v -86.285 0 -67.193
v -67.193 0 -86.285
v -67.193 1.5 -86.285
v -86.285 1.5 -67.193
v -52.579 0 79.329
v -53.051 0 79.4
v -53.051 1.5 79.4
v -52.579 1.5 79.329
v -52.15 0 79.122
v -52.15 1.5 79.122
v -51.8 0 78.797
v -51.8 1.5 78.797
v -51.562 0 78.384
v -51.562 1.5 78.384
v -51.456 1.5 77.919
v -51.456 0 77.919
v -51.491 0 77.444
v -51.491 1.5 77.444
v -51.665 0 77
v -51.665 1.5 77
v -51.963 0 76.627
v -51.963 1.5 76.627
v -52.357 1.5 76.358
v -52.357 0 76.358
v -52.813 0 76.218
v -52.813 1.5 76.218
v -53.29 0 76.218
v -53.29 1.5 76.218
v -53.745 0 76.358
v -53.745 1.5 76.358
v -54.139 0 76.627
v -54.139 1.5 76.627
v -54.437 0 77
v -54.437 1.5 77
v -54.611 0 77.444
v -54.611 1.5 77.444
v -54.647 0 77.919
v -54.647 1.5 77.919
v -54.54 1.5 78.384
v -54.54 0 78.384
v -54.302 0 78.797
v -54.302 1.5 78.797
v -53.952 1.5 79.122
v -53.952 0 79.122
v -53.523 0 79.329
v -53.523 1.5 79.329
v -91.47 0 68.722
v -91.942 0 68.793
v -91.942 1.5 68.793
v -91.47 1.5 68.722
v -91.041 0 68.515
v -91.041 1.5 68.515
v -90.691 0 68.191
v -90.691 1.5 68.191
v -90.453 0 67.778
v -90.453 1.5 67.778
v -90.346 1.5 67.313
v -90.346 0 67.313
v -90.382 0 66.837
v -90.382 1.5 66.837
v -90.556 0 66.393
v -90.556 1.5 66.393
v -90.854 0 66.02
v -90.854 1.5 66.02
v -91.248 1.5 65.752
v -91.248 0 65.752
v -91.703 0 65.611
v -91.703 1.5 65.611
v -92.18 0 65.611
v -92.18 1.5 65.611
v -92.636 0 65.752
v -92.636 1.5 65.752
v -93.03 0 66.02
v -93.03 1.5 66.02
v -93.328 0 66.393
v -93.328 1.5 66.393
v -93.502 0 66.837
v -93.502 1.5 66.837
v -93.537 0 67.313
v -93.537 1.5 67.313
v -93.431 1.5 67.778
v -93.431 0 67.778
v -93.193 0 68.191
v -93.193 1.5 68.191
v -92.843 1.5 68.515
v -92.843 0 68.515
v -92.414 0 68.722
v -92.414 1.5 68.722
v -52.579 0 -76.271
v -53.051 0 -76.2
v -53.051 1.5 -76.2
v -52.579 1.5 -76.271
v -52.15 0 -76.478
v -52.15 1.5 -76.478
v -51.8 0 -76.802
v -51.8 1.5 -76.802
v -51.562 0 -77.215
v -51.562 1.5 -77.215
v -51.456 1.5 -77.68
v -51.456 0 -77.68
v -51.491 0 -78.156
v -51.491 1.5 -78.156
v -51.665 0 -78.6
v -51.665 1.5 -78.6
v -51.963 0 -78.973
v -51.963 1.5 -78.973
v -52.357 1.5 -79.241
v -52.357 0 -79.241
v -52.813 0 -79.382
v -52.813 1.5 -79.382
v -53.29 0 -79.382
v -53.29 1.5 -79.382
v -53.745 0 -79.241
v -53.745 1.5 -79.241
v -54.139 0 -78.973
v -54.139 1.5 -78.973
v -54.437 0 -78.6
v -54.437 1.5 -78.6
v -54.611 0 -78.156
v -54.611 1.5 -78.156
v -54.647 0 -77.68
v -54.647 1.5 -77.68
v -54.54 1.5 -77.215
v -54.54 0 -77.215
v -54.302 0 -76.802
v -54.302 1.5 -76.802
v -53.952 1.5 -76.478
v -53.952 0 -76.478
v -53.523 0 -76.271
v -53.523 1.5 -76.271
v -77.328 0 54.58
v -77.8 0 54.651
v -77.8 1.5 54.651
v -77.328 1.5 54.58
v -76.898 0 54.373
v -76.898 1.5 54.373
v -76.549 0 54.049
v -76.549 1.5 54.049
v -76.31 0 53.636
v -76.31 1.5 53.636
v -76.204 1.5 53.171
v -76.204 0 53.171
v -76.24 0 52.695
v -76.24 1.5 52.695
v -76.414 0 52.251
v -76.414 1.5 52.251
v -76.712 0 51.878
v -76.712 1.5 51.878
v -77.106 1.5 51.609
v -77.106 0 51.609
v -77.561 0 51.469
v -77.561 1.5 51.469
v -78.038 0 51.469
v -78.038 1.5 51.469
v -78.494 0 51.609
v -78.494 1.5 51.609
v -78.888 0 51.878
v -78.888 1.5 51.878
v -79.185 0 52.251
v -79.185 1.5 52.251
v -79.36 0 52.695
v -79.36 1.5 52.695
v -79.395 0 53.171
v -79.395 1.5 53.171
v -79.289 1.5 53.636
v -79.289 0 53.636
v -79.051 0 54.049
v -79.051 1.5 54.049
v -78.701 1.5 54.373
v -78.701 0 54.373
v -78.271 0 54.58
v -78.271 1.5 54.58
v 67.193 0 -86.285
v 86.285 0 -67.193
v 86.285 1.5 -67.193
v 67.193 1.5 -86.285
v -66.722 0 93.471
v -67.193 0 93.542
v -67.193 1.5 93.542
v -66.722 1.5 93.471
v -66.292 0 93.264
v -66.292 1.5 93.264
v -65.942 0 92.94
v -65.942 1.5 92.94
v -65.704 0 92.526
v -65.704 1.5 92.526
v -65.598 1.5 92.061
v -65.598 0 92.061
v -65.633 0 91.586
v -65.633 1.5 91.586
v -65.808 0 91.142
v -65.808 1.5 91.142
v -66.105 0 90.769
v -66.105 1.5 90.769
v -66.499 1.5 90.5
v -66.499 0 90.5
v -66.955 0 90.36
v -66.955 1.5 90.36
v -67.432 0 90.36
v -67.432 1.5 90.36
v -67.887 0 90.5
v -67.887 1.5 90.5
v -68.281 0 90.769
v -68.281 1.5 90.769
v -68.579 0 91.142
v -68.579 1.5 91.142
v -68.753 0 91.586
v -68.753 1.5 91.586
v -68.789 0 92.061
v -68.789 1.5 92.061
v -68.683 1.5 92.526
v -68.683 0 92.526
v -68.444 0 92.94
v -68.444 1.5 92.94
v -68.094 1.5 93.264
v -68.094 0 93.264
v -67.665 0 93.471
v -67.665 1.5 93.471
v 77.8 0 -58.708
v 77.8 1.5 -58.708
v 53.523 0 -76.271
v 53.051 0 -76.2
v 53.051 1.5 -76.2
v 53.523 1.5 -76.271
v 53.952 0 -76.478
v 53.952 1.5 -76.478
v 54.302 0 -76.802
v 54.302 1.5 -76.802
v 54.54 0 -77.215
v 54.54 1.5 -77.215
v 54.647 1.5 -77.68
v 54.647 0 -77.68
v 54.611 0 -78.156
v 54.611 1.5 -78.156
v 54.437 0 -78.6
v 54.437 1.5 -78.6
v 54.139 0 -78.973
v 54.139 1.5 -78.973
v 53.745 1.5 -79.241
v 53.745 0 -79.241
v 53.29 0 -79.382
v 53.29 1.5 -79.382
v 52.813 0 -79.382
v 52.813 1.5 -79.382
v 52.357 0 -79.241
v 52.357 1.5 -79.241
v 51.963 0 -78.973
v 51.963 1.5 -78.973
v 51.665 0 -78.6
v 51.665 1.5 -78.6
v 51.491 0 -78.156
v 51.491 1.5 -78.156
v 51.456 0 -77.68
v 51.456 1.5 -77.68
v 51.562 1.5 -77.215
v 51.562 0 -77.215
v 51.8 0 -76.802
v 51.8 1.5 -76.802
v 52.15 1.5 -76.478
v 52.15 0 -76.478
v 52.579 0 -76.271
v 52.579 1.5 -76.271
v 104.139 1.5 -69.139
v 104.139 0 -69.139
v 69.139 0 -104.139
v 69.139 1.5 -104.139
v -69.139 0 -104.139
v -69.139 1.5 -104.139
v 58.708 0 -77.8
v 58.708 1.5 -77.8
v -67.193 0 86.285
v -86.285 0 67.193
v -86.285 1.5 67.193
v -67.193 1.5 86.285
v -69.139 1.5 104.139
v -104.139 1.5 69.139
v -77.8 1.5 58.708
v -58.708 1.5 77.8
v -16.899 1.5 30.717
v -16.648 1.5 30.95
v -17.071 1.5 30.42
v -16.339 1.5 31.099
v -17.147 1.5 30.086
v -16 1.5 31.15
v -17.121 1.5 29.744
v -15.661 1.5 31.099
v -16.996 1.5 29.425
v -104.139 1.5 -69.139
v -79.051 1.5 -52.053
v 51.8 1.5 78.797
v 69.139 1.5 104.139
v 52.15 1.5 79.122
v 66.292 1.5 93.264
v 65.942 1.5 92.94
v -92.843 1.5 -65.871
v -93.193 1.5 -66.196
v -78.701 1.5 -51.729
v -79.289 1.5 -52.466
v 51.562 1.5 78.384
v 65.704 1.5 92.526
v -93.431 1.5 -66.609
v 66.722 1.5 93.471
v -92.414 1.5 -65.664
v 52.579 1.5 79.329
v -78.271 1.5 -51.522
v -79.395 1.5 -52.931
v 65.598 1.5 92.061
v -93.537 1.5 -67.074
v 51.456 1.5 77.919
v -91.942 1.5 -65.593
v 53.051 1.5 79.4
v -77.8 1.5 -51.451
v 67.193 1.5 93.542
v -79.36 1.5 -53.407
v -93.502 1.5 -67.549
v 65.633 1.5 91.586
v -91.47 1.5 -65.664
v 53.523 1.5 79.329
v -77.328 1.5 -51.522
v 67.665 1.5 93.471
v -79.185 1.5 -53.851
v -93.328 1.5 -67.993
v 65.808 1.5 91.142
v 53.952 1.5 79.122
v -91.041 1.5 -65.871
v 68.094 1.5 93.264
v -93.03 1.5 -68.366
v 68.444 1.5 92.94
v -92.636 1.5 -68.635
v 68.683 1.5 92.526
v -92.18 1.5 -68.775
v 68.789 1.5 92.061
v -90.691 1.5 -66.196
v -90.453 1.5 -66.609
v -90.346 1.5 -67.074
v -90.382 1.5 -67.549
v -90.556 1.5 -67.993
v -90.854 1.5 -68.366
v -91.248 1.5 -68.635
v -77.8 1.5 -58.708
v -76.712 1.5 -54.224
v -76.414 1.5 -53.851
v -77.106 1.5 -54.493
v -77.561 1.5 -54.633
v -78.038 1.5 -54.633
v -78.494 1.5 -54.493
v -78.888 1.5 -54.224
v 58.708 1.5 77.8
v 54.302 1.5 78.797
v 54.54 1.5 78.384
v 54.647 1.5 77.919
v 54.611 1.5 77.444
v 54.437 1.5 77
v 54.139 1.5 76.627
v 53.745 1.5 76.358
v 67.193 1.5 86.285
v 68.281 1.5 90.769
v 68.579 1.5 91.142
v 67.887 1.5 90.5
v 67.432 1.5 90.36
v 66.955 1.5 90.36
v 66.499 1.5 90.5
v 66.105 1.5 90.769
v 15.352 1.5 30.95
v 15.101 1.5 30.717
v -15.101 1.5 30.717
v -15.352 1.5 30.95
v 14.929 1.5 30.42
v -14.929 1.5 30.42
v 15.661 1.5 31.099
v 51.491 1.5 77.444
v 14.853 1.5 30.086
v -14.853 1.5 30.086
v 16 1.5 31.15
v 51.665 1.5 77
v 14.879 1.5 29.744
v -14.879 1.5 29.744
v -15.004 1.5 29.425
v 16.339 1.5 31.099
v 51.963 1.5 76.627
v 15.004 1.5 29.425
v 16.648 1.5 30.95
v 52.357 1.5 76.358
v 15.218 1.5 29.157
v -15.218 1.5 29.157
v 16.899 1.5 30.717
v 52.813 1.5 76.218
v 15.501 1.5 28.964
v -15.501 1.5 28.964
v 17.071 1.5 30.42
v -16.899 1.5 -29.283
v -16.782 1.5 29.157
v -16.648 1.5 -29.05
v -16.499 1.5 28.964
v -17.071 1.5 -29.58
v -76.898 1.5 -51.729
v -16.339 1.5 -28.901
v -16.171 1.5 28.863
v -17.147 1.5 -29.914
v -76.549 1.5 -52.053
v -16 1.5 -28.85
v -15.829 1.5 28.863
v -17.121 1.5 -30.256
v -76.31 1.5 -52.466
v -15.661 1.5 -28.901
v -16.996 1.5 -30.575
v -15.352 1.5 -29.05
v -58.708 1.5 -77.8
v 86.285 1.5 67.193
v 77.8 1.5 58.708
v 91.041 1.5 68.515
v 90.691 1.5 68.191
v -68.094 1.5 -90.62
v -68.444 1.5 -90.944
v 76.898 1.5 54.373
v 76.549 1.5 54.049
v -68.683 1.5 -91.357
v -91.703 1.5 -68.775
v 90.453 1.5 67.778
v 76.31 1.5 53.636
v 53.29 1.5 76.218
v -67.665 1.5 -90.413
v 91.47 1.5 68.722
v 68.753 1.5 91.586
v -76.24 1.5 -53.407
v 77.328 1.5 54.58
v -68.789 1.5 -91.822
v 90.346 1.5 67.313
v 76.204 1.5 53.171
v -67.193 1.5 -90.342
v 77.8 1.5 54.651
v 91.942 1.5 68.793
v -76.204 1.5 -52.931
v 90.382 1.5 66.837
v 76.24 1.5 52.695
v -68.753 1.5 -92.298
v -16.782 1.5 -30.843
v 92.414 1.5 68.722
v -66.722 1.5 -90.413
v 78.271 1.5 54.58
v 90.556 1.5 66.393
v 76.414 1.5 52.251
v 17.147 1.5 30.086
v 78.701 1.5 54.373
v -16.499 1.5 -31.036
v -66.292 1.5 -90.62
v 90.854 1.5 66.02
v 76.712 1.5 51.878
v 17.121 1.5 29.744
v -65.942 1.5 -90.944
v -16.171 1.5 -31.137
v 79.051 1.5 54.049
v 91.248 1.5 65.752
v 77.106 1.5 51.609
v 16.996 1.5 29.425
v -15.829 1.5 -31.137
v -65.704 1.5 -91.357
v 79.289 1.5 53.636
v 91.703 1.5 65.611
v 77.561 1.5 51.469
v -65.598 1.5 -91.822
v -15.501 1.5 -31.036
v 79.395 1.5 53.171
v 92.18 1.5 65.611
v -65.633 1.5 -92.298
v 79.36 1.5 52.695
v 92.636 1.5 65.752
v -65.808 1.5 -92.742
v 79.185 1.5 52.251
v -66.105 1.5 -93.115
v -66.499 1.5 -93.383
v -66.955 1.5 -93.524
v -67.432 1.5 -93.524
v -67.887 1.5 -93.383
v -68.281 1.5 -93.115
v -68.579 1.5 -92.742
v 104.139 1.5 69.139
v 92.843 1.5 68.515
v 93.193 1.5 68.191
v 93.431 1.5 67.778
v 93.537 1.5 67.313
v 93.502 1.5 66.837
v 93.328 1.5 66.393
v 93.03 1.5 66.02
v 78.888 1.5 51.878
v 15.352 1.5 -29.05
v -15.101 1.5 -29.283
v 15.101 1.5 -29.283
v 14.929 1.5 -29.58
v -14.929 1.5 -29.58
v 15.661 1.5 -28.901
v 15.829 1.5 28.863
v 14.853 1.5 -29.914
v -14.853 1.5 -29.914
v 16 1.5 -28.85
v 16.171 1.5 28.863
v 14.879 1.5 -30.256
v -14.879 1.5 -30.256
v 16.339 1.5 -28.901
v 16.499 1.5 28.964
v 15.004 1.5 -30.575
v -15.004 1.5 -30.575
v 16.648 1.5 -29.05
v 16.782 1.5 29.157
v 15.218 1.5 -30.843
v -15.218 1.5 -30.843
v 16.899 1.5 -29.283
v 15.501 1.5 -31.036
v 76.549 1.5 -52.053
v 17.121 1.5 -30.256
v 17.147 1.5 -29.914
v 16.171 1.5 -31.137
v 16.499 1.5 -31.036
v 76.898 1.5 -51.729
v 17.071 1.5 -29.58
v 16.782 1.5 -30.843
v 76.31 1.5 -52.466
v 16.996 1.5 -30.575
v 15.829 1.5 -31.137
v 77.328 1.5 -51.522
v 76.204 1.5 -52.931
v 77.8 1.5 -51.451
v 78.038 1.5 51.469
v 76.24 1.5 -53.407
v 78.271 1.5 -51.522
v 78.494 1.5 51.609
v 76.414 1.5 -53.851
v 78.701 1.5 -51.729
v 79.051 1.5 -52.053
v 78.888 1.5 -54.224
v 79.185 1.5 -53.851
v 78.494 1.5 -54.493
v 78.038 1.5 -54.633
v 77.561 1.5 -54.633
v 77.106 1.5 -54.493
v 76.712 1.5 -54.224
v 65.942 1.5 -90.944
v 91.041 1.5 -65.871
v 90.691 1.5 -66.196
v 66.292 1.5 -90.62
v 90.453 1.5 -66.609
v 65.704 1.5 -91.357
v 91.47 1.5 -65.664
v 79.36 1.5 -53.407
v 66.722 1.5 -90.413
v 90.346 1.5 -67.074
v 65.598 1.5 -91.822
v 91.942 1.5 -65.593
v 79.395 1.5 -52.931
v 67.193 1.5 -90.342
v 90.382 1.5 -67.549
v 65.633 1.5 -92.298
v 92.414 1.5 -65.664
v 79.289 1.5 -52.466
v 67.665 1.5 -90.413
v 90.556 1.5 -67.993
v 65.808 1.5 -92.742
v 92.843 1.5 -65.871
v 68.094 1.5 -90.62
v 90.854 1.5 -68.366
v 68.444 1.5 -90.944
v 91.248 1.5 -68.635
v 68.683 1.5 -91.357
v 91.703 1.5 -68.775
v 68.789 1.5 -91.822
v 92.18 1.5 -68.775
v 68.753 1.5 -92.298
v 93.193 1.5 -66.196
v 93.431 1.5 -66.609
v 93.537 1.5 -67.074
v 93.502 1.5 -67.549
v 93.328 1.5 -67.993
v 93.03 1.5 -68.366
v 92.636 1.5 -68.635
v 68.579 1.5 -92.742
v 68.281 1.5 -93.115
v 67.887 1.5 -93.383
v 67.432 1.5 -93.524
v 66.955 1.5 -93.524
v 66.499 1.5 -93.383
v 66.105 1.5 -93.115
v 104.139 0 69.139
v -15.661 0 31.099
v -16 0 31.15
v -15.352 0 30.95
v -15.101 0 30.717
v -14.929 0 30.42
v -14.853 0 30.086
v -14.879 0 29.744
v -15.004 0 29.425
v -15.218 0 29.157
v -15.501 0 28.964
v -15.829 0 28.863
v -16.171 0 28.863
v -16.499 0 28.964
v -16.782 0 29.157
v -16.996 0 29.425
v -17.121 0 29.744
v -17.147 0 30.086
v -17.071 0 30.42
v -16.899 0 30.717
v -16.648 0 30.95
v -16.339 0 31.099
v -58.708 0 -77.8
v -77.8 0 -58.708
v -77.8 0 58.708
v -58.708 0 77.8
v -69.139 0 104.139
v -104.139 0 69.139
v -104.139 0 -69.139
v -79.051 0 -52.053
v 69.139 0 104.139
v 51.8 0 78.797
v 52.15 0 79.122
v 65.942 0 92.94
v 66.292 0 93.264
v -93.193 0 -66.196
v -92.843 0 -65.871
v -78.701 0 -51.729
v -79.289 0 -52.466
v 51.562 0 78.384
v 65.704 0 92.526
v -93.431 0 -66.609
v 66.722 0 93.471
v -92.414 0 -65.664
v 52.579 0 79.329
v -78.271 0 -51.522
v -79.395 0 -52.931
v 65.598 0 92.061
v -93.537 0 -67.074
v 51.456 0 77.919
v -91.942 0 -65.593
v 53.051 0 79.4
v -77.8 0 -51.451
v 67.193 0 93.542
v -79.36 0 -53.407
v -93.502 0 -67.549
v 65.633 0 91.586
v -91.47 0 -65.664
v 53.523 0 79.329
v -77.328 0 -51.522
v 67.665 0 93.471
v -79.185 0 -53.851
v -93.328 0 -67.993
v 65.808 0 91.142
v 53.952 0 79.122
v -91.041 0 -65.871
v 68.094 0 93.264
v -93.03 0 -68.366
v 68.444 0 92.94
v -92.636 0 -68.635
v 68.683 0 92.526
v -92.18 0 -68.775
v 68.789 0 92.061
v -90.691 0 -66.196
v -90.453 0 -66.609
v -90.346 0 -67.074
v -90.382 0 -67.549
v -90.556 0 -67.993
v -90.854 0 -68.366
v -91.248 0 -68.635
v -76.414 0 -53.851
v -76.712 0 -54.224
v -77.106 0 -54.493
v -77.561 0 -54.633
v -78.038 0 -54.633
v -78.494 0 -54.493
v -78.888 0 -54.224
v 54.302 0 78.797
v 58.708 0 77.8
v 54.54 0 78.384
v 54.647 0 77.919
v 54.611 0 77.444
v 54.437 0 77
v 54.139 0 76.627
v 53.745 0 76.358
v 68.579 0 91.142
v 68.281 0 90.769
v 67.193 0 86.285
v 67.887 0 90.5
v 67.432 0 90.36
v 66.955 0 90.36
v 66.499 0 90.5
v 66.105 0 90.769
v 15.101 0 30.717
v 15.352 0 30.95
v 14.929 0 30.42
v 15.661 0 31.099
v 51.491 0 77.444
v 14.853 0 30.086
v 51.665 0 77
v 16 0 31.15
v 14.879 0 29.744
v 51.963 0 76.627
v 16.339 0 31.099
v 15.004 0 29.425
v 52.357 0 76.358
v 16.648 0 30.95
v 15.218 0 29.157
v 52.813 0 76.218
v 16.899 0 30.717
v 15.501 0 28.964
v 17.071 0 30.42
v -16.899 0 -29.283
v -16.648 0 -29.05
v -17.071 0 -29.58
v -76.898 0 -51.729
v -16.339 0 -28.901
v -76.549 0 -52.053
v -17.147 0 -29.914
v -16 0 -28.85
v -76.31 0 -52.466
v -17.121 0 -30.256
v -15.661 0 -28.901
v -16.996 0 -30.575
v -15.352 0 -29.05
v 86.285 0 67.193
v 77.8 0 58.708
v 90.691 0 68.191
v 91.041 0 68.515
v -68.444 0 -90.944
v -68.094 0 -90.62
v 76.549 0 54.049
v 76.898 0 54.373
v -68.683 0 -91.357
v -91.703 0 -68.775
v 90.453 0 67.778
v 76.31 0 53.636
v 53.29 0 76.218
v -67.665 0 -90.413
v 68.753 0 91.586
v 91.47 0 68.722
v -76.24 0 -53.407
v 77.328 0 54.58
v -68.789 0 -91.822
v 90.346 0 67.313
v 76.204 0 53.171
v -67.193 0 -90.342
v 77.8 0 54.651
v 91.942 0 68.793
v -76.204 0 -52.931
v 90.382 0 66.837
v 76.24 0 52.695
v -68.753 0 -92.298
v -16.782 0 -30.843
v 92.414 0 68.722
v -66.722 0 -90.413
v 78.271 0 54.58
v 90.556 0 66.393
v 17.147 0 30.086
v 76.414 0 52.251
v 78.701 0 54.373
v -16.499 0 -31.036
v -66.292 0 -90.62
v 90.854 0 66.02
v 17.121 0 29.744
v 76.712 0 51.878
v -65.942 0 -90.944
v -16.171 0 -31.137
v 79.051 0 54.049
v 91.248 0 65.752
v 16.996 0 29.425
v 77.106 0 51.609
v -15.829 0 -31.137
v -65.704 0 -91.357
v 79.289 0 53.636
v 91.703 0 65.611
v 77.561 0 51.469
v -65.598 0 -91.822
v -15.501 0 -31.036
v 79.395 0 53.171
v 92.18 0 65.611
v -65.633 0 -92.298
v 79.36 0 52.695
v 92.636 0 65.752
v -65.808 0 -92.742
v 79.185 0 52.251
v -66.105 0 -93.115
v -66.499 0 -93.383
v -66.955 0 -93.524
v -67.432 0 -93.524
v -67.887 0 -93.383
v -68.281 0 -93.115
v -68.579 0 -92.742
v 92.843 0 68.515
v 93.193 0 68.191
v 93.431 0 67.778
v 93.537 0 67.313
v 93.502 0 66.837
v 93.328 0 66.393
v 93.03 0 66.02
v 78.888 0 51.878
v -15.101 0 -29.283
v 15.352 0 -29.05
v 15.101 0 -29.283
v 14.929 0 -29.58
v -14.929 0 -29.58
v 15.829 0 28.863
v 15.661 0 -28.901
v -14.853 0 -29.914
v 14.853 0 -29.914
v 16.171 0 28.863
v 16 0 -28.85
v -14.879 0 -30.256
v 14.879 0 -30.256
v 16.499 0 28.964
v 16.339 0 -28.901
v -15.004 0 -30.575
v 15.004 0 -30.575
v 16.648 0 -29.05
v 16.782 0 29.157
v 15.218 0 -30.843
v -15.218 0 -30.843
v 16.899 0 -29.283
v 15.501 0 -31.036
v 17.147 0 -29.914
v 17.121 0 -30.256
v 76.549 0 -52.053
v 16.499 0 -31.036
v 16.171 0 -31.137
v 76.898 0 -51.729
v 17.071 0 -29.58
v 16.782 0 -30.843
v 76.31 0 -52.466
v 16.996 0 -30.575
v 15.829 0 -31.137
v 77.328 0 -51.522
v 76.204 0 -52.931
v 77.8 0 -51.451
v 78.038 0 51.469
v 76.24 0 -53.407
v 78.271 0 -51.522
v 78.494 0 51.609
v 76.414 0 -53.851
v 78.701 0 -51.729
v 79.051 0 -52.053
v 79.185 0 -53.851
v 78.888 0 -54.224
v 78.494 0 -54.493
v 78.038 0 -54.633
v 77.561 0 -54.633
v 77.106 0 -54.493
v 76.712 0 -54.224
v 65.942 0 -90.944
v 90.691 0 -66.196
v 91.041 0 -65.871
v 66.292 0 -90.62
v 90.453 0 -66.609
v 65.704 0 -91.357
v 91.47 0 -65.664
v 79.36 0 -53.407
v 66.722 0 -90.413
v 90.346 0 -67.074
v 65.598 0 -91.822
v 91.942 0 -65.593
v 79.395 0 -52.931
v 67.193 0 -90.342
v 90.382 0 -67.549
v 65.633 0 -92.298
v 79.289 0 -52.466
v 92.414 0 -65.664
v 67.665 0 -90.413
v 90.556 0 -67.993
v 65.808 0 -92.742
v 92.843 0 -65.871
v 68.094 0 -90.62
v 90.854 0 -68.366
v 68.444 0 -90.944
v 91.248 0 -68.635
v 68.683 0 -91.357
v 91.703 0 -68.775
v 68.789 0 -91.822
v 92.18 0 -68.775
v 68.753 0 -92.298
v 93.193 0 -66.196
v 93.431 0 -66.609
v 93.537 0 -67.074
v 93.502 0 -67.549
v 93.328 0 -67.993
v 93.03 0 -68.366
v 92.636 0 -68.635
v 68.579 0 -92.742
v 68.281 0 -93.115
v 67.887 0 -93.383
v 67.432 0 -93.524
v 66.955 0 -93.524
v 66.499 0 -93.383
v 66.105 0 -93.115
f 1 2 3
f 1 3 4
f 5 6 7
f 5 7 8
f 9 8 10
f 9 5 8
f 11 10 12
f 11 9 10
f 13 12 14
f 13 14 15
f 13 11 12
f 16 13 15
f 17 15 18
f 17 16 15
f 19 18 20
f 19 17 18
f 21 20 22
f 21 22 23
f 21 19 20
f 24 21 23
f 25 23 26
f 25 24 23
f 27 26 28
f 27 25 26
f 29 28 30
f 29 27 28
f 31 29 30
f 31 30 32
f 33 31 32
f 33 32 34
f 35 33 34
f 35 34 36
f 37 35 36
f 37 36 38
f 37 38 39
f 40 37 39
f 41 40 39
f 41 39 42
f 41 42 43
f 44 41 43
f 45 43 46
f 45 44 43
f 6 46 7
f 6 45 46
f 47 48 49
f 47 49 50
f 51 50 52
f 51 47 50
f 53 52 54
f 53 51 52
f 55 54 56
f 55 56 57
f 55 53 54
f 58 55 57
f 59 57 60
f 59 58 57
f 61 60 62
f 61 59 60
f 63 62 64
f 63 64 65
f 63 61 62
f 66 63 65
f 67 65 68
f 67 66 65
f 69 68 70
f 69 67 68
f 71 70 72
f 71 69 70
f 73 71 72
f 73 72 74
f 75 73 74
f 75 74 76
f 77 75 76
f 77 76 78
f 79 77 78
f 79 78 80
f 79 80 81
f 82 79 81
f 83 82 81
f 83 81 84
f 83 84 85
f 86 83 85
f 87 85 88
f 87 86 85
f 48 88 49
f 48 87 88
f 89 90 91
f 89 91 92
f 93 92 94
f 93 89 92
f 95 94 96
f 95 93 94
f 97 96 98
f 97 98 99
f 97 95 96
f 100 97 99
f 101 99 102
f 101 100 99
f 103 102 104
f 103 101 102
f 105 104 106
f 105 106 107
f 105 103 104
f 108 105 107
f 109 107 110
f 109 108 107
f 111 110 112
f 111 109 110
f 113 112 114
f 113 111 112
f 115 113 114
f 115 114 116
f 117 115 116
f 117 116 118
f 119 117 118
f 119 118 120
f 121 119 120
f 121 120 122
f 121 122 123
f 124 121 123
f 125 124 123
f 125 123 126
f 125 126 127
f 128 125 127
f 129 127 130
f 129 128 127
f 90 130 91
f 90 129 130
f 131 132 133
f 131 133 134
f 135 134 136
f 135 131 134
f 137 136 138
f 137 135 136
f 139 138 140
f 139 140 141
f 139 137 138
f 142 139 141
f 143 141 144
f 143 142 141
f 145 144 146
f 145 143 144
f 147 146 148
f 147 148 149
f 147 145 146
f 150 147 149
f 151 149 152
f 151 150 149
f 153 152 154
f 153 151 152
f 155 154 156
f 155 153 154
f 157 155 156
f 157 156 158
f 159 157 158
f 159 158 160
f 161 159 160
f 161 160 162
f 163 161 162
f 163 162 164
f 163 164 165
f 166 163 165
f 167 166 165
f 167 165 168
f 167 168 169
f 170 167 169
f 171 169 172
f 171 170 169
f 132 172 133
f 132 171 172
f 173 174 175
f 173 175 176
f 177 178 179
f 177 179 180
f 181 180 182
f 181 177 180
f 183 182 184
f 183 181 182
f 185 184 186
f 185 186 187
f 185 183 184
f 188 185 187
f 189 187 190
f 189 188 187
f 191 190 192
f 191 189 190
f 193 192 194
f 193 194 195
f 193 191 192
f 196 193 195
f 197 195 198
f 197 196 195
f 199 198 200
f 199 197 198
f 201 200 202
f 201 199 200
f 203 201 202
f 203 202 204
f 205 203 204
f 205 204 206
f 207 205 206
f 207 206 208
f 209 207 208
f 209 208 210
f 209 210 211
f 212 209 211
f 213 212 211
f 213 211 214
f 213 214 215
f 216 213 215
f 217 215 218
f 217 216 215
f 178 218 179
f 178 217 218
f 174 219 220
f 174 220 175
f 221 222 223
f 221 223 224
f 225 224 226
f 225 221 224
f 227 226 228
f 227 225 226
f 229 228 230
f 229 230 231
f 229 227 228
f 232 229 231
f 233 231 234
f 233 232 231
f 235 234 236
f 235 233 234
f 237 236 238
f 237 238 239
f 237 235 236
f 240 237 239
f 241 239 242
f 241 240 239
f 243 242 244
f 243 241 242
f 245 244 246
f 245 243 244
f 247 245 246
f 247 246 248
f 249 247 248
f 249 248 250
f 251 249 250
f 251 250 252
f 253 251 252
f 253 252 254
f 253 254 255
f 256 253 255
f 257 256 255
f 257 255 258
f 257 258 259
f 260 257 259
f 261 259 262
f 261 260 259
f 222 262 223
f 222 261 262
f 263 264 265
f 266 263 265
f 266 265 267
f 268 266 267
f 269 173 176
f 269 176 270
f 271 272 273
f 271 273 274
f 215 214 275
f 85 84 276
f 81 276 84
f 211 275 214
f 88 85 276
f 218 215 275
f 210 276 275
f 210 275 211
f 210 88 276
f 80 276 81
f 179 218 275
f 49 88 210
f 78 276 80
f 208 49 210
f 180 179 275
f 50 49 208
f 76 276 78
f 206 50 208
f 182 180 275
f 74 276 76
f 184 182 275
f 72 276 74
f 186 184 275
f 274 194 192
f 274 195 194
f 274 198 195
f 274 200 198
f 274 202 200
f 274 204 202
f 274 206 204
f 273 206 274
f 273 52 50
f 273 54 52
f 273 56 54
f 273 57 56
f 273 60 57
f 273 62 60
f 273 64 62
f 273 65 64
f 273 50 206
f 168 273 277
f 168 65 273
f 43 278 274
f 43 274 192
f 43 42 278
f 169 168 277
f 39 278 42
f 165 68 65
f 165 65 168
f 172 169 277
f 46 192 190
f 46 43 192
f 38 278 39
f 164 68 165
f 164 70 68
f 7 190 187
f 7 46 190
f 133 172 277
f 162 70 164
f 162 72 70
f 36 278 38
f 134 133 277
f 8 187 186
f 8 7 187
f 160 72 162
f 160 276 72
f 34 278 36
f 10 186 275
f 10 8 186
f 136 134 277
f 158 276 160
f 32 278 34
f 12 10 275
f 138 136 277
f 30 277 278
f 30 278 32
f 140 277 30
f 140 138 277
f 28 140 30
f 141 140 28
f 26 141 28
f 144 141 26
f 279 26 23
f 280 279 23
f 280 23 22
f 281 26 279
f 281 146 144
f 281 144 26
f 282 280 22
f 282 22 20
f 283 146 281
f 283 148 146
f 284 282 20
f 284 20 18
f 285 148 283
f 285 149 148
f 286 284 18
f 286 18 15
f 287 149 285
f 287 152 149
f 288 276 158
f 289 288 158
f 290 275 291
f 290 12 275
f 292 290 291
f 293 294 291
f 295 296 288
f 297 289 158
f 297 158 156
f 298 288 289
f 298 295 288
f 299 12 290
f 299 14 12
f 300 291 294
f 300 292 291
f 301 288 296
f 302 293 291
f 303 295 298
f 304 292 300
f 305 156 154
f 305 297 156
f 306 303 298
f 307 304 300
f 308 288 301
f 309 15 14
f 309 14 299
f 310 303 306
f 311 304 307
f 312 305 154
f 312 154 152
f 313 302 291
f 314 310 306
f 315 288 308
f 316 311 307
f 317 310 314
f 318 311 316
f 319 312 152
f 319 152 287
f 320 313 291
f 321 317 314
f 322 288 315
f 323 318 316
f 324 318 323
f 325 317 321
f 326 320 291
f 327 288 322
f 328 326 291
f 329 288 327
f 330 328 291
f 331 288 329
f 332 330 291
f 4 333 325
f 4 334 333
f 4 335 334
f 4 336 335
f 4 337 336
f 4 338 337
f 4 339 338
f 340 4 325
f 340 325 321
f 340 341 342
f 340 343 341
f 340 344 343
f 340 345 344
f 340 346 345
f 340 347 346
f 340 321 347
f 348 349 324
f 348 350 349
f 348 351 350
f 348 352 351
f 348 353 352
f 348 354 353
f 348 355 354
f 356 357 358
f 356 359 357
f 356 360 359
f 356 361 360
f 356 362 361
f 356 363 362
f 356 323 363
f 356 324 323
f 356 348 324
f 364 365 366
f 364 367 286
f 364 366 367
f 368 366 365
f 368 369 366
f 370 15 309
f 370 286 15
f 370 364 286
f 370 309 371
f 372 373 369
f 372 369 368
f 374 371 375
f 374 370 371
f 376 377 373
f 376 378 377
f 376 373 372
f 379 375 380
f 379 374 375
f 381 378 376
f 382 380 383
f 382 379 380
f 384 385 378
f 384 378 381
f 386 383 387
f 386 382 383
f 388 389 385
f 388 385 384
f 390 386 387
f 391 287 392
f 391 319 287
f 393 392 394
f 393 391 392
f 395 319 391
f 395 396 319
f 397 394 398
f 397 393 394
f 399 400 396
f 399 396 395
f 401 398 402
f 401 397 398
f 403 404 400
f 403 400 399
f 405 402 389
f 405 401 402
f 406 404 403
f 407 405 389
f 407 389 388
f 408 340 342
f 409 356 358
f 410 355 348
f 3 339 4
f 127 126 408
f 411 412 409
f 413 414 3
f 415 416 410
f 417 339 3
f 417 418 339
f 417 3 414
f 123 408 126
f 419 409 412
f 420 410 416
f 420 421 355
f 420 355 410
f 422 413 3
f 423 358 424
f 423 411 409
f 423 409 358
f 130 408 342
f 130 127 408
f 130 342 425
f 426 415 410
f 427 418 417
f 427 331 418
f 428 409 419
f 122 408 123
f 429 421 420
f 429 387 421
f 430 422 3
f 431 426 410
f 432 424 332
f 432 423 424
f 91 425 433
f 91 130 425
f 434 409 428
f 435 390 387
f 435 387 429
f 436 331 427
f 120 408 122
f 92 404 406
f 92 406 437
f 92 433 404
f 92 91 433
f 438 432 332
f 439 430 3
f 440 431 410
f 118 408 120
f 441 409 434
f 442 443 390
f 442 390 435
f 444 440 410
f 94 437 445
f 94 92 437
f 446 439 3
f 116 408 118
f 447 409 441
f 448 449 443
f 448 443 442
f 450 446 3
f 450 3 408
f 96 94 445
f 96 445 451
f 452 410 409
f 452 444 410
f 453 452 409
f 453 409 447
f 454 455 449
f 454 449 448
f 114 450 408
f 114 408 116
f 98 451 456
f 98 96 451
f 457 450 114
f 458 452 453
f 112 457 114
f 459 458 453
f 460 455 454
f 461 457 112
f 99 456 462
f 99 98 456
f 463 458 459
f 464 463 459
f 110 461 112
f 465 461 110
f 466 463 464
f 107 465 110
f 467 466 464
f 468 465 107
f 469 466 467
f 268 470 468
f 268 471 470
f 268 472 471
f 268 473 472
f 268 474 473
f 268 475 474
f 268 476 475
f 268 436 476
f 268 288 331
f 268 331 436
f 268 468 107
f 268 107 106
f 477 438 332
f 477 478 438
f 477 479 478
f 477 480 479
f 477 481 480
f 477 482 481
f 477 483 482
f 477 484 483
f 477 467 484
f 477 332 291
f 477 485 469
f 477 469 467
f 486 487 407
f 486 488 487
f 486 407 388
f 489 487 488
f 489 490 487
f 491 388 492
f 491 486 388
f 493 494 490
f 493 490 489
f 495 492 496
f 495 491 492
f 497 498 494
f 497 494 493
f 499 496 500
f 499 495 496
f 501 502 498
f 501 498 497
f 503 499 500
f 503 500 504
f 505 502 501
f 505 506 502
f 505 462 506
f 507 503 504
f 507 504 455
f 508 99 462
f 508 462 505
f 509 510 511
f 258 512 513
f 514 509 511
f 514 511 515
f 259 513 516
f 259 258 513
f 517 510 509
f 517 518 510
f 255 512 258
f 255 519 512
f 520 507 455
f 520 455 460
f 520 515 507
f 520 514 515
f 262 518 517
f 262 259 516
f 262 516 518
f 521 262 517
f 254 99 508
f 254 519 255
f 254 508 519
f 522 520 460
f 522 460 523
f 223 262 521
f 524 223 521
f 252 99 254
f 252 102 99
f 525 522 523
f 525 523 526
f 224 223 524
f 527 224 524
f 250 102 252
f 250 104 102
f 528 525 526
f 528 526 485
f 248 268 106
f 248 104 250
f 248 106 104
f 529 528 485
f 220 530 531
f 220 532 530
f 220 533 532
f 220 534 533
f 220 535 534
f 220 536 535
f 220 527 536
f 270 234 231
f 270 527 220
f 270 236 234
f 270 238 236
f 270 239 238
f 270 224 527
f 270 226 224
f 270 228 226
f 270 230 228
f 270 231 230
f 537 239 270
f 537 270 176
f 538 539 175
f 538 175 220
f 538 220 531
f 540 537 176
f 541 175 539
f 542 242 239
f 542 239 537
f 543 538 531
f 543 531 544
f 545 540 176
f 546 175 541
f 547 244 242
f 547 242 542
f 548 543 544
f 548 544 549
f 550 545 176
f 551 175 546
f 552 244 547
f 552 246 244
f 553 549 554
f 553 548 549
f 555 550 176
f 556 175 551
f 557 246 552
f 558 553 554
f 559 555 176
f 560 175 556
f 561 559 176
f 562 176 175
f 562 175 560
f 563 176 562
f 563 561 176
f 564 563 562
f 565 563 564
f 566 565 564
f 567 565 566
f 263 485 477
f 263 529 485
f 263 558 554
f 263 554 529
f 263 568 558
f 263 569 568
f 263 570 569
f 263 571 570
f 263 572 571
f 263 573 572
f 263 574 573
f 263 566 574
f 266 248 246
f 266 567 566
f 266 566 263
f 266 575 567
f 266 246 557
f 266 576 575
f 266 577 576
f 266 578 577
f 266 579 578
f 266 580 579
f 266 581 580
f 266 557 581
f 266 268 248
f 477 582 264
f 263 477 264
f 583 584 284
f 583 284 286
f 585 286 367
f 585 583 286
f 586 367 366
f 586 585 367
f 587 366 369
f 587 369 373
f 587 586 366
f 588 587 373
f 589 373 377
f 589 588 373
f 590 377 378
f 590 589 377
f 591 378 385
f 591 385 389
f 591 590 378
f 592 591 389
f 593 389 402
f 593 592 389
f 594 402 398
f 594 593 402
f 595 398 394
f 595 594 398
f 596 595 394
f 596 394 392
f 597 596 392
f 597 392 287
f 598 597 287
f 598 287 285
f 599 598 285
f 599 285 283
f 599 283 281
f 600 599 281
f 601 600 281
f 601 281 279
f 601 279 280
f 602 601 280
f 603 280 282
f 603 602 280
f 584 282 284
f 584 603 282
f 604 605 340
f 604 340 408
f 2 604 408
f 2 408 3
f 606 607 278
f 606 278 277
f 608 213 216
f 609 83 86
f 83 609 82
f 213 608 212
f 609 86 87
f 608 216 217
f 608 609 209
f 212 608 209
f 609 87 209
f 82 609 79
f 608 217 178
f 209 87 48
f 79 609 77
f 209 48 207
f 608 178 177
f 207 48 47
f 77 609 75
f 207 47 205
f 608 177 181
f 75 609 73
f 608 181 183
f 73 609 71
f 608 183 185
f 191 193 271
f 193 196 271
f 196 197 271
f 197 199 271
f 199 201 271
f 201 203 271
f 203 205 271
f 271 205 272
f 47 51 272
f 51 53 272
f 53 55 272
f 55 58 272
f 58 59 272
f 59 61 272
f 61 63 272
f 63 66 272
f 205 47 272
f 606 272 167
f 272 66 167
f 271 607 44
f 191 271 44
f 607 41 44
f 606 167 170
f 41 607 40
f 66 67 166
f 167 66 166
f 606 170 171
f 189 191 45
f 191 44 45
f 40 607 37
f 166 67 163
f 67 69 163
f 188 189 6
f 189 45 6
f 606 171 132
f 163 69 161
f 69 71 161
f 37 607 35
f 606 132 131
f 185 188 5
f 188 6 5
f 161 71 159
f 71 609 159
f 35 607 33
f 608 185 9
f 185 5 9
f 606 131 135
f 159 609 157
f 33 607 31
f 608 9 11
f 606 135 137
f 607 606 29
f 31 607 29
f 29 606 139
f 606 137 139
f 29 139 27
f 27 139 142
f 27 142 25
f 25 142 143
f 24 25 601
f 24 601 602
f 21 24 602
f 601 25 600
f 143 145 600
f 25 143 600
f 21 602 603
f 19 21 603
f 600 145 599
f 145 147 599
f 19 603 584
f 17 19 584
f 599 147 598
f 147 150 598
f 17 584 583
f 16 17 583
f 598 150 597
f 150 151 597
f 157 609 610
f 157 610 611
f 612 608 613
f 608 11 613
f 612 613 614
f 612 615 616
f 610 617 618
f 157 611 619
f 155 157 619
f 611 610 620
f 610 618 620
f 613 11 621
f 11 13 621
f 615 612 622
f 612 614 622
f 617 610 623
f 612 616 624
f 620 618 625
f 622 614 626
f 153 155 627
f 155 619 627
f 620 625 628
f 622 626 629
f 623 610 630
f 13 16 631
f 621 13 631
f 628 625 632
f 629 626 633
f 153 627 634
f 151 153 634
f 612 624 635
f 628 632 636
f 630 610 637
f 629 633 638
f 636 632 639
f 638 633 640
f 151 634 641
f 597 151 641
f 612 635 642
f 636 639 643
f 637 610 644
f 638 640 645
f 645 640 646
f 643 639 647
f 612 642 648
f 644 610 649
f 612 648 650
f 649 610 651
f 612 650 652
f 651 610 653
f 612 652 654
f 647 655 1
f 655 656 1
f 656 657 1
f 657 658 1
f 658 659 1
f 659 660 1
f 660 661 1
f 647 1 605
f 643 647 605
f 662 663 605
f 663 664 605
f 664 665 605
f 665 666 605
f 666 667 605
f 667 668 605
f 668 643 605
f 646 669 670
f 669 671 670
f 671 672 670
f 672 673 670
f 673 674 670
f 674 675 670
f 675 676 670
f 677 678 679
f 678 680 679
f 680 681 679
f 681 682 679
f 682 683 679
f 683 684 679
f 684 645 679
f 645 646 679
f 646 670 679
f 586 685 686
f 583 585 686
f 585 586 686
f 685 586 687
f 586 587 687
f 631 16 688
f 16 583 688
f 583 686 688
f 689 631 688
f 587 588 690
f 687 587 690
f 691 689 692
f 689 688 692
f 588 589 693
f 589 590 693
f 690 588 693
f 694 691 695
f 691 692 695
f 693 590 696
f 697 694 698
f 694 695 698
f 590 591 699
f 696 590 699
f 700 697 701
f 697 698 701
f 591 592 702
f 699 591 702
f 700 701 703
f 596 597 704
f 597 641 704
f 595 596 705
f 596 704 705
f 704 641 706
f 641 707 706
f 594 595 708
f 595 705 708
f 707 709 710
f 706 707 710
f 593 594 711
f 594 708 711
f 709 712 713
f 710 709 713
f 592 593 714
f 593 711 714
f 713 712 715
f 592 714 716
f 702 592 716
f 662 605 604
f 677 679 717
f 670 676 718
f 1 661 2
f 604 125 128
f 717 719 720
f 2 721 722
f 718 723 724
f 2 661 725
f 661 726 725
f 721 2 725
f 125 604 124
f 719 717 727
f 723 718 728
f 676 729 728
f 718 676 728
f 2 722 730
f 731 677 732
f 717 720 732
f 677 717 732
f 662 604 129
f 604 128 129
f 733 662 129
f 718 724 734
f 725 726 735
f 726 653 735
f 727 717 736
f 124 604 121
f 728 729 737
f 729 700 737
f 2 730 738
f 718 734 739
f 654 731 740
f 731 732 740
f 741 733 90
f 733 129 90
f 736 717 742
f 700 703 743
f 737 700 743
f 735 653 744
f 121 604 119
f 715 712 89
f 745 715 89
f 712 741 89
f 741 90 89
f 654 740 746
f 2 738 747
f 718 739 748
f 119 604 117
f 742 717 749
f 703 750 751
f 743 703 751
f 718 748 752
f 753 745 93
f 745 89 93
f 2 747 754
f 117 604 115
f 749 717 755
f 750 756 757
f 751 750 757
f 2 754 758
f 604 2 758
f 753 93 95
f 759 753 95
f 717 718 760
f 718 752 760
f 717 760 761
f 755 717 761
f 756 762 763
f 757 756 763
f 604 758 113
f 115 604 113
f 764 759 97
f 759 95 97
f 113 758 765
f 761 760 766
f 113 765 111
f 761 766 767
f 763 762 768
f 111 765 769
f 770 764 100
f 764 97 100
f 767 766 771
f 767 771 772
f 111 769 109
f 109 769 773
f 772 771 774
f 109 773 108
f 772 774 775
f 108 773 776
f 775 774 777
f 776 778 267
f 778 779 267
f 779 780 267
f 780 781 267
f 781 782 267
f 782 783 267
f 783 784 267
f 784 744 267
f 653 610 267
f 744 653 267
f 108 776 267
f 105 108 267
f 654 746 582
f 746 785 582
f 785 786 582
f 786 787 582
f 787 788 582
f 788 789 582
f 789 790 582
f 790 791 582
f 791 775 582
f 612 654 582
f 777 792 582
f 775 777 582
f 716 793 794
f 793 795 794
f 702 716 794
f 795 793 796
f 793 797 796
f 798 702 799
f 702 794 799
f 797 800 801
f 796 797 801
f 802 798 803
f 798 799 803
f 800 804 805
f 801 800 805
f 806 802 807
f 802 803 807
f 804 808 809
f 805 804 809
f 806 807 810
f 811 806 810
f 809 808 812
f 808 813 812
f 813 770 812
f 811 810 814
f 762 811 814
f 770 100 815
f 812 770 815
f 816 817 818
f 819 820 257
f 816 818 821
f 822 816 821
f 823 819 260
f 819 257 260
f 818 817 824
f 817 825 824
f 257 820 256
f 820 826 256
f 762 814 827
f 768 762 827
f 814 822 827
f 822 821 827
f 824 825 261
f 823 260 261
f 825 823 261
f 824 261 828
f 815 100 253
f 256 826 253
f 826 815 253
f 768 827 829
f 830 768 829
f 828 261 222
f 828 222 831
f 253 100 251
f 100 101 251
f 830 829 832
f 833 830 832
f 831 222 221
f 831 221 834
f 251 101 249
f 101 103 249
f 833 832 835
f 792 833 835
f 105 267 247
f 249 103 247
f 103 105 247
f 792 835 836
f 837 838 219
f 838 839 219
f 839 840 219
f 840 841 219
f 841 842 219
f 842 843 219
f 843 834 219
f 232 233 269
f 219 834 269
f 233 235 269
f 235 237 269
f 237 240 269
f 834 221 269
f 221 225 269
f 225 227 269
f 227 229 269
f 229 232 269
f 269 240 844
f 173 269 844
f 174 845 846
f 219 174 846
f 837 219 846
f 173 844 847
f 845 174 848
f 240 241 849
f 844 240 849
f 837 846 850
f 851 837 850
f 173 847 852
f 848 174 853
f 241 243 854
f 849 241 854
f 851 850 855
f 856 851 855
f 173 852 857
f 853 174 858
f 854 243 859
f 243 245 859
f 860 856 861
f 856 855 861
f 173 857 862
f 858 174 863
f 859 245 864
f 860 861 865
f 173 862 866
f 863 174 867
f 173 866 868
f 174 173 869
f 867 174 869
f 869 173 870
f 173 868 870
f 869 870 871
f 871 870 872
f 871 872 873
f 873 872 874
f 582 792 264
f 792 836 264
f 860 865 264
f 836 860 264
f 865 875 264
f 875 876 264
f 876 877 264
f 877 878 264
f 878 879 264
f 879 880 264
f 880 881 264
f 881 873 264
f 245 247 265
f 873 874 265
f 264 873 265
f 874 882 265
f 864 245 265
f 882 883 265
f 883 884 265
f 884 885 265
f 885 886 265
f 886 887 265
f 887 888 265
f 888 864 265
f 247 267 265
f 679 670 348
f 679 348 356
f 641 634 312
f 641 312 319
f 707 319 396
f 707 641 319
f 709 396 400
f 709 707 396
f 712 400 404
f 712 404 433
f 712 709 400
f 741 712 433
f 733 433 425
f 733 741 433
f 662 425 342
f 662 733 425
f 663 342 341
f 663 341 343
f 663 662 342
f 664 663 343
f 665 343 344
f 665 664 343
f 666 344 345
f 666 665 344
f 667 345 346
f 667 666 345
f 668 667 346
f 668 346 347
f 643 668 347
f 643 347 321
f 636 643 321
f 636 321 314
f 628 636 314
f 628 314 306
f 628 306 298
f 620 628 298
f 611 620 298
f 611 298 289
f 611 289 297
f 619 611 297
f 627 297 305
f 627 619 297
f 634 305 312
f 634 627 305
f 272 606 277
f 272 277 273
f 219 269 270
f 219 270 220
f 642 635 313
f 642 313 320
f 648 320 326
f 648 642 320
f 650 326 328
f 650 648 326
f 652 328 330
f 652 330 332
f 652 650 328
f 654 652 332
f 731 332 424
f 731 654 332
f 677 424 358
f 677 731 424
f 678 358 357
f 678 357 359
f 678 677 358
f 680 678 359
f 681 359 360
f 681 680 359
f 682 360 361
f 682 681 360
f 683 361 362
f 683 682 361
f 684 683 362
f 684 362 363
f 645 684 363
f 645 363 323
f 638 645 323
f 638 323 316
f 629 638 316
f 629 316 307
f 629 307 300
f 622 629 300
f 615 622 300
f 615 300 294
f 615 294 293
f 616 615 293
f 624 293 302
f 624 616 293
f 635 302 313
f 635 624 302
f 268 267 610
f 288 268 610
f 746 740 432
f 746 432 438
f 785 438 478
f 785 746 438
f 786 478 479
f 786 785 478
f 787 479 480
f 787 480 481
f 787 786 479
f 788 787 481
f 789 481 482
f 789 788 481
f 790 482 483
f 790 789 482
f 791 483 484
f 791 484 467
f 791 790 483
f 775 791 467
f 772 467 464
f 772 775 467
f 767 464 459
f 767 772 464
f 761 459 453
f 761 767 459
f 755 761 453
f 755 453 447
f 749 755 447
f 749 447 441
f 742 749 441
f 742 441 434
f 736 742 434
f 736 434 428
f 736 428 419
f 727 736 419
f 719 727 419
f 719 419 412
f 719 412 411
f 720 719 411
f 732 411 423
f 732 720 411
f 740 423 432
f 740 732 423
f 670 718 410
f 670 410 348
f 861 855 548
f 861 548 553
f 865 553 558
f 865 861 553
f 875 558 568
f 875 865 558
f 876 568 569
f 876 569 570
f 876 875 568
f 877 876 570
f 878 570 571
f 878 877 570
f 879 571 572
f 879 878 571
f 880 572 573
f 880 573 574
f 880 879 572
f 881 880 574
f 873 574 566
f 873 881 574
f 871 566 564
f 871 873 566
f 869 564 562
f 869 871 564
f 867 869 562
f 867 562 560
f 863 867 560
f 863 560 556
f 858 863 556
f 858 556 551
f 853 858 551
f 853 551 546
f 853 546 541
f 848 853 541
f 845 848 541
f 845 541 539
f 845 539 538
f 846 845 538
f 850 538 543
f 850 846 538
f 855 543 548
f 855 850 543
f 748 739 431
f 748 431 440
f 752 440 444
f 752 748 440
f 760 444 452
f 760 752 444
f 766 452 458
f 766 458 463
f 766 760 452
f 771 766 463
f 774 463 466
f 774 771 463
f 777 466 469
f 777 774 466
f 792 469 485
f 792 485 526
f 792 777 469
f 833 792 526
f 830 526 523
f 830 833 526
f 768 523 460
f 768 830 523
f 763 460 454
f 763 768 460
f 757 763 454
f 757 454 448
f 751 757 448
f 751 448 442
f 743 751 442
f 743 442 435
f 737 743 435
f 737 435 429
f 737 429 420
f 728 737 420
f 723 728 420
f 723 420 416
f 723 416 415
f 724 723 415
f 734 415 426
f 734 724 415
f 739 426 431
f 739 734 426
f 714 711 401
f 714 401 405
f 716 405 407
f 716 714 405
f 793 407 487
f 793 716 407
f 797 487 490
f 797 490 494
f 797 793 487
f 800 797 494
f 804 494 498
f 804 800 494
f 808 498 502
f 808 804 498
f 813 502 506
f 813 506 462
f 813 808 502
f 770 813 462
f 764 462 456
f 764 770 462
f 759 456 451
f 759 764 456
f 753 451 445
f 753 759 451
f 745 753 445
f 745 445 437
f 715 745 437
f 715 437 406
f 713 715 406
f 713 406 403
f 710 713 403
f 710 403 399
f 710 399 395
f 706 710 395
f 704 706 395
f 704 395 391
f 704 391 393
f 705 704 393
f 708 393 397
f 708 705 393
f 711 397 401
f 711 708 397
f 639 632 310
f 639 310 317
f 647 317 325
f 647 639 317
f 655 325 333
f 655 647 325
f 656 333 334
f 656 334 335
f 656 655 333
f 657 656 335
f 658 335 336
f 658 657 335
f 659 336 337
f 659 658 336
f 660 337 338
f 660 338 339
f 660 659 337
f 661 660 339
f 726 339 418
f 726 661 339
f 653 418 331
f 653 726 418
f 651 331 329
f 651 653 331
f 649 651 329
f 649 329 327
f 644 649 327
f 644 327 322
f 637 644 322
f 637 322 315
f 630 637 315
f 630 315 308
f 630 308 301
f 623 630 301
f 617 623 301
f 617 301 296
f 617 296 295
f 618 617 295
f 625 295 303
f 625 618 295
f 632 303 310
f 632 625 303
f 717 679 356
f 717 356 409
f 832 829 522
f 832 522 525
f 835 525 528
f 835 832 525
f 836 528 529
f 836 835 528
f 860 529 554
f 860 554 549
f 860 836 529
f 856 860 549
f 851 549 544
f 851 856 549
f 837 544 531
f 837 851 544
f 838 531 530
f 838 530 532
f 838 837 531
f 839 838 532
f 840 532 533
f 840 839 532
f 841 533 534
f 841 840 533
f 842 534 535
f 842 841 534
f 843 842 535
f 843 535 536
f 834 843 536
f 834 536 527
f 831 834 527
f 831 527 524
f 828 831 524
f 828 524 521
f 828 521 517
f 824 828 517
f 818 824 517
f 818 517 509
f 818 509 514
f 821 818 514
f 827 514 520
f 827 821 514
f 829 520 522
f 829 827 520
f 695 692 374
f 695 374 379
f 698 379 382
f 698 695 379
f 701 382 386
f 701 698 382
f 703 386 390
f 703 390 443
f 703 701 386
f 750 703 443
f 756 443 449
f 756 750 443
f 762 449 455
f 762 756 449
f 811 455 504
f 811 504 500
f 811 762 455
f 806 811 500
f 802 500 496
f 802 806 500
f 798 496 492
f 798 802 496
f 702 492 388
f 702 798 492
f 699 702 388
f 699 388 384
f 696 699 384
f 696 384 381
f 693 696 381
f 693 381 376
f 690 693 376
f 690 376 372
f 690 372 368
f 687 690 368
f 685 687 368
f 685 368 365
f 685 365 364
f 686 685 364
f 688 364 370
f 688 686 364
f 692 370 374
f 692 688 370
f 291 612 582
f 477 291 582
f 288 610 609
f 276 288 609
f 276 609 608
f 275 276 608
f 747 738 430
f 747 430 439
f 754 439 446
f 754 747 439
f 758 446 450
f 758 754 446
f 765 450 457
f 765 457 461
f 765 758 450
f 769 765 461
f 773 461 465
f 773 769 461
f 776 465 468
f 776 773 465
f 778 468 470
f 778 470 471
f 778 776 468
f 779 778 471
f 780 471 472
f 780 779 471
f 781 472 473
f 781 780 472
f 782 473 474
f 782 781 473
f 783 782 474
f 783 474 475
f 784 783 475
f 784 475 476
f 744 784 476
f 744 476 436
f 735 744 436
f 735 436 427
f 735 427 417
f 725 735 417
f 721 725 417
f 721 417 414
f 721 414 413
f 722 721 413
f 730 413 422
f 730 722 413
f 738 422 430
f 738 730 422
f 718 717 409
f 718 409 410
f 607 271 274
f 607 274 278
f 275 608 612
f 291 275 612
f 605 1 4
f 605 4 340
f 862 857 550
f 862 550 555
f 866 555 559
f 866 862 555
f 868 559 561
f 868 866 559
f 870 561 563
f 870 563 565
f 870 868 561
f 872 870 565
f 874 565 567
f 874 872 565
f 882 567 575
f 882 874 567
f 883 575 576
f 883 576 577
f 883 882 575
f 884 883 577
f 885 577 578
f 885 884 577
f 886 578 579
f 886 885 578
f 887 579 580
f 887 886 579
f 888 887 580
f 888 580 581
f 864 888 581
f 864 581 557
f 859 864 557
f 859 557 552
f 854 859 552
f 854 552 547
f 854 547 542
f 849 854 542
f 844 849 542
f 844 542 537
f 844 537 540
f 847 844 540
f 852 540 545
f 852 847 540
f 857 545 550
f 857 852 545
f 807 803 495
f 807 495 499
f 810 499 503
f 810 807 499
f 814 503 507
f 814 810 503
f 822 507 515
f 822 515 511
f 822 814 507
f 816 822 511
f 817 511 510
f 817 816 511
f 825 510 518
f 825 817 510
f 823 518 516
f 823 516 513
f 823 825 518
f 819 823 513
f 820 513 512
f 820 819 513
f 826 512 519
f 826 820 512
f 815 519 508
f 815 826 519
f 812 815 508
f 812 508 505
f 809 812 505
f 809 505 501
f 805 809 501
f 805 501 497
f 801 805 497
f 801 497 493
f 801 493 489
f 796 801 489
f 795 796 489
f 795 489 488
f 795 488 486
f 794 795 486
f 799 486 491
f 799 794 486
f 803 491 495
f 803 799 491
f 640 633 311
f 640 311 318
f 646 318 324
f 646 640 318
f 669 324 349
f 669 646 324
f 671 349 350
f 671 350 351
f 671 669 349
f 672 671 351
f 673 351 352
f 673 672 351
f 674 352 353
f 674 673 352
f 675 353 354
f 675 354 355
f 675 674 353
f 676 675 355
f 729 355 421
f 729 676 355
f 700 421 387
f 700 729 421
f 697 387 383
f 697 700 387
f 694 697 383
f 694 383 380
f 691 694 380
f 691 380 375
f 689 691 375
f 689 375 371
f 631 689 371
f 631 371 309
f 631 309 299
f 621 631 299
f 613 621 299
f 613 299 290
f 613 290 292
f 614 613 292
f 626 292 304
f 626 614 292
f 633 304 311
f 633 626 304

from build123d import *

# Parameters (mm, degrees)
SKETCH2_R           = 1.6
SKETCH2_R_2         = 1.15
BOSS_EXTRUDE1_DEPTH = 1.5


with BuildPart() as part:
    # Sketch2 → Boss-Extrude1 (new body)
    with BuildSketch(Plane(origin=(0, 0, 0), x_dir=(1, 0, 0), z_dir=(0, 1, 0))):
        Polygon((104.138617256, -69.138617256), (104.138617256, 69.138617256), (69.138617256, 104.138617256), (-69.138617256, 104.138617256), (-104.138617256, 69.138617256), (-104.138617256, -69.138617256), (-69.138617256, -104.138617256), (69.138617256, -104.138617256), align=None)
        with Locations(Location((67.193180773, -91.941918115, 0), (0, 0, 270))):
            Circle(SKETCH2_R, mode=Mode.SUBTRACT)
        with Locations(Location((53.051045149, -77.799782491, 0), (0, 0, 270))):
            Circle(SKETCH2_R, mode=Mode.SUBTRACT)
        with Locations(Location((77.799782491, -53.051045149, 0), (0, 0, 270))):
            Circle(SKETCH2_R, mode=Mode.SUBTRACT)
        with Locations(Location((91.941918115, -67.193180773, 0), (0, 0, 270))):
            Circle(SKETCH2_R, mode=Mode.SUBTRACT)
        with Locations(Location((-67.193180773, -91.941918115, 0), (0, 0, 270))):
            Circle(SKETCH2_R, mode=Mode.SUBTRACT)
        with Locations(Location((-91.941918115, -67.193180773, 0), (0, 0, 270))):
            Circle(SKETCH2_R, mode=Mode.SUBTRACT)
        with Locations(Location((-77.799782491, -53.051045149, 0), (0, 0, 270))):
            Circle(SKETCH2_R, mode=Mode.SUBTRACT)
        with Locations(Location((-53.051045149, -77.799782491, 0), (0, 0, 270))):
            Circle(SKETCH2_R, mode=Mode.SUBTRACT)
        with Locations(Location((-77.799782491, 53.051045149, 0), (0, 0, 270))):
            Circle(SKETCH2_R, mode=Mode.SUBTRACT)
        with Locations(Location((-53.051045149, 77.799782491, 0), (0, 0, 270))):
            Circle(SKETCH2_R, mode=Mode.SUBTRACT)
        with Locations(Location((-67.193180773, 91.941918115, 0), (0, 0, 270))):
            Circle(SKETCH2_R, mode=Mode.SUBTRACT)
        with Locations(Location((-91.941918115, 67.193180773, 0), (0, 0, 270))):
            Circle(SKETCH2_R, mode=Mode.SUBTRACT)
        with Locations(Location((77.799782491, 53.051045149, 0), (0, 0, 270))):
            Circle(SKETCH2_R, mode=Mode.SUBTRACT)
        with Locations(Location((53.051045149, 77.799782491, 0), (0, 0, 270))):
            Circle(SKETCH2_R, mode=Mode.SUBTRACT)
        with Locations(Location((67.193180773, 91.941918115, 0), (0, 0, 270))):
            Circle(SKETCH2_R, mode=Mode.SUBTRACT)
        with Locations(Location((91.941918115, 67.193180773, 0), (0, 0, 270))):
            Circle(SKETCH2_R, mode=Mode.SUBTRACT)
        with Locations(Location((16, 30, 0), (0, 0, 270))):
            Circle(SKETCH2_R_2, mode=Mode.SUBTRACT)
        with Locations(Location((-16, 30, 0), (0, 0, 270))):
            Circle(SKETCH2_R_2, mode=Mode.SUBTRACT)
        with Locations(Location((-16, -30, 0), (0, 0, 270))):
            Circle(SKETCH2_R_2, mode=Mode.SUBTRACT)
        with Locations(Location((16, -30, 0), (0, 0, 270))):
            Circle(SKETCH2_R_2, mode=Mode.SUBTRACT)
        Polygon((86.285063865, -67.193180773), (77.799782491, -58.707899399), (58.707899399, -77.799782491), (67.193180773, -86.285063865), align=None, mode=Mode.SUBTRACT)
        Polygon((-67.193180773, -86.285063865), (-58.707899399, -77.799782491), (-77.799782491, -58.707899399), (-86.285063865, -67.193180773), align=None, mode=Mode.SUBTRACT)
        Polygon((-86.285063865, 67.193180773), (-77.799782491, 58.707899399), (-58.707899399, 77.799782491), (-67.193180773, 86.285063865), align=None, mode=Mode.SUBTRACT)
        Polygon((77.799782491, 58.707899399), (86.285063865, 67.193180773), (67.193180773, 86.285063865), (58.707899399, 77.799782491), align=None, mode=Mode.SUBTRACT)
    extrude(amount=BOSS_EXTRUDE1_DEPTH)


solid = part.part
